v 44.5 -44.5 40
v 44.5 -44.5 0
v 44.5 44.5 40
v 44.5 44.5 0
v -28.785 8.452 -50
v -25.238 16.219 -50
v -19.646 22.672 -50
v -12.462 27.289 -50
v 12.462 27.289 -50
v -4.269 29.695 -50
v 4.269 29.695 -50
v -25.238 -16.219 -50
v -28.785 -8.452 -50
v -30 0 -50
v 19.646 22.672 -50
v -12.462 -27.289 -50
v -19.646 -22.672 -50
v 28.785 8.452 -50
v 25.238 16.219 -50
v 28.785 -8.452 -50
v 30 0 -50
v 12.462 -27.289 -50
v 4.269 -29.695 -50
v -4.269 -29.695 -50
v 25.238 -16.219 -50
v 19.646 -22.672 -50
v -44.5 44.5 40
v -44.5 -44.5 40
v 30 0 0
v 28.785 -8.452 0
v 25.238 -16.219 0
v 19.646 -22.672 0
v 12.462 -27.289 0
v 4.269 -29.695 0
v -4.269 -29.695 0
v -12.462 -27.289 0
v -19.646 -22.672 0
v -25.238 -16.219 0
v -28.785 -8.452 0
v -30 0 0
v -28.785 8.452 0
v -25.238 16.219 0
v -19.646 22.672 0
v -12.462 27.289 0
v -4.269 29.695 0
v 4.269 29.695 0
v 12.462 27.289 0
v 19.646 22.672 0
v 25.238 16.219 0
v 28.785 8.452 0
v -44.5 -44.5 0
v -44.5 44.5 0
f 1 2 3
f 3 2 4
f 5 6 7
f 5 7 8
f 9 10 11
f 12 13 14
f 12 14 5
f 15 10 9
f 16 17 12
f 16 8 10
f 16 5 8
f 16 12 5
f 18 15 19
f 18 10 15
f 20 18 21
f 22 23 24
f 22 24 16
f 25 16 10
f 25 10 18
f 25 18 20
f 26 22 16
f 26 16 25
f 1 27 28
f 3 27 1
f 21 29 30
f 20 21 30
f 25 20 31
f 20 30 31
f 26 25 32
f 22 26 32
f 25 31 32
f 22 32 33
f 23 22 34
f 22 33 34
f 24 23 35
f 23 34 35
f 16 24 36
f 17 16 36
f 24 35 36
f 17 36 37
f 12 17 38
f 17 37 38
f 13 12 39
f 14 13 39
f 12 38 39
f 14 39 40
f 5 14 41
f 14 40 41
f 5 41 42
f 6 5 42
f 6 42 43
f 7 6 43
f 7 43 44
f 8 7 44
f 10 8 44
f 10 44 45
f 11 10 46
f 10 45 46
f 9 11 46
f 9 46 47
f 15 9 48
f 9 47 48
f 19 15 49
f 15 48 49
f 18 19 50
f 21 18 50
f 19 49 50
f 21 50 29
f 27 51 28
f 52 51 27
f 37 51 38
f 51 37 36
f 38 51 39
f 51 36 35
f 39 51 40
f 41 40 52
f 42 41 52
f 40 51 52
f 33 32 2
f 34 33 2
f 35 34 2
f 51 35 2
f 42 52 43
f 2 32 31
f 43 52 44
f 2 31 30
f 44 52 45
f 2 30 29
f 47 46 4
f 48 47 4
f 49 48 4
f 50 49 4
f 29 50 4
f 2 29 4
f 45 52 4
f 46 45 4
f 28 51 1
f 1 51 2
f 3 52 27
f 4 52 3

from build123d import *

# Parameters (mm, degrees)
F0_W     = 89
F0_H     = 89
F1_DEPTH = 40
F2_R     = 30
F3_DEPTH = 50


with BuildPart() as f1:
    # F0 (on Top) → F1 (new body)
    with BuildSketch(Plane.XY):
        Rectangle(F0_W, F0_H)
    extrude(amount=F1_DEPTH)

    # F2 (on face) → F3 (join)
    with BuildSketch(Plane(origin=(0, 0, 0), x_dir=(1, 0, 0), z_dir=(0, 0, -1))):
        Circle(F2_R)
    extrude(amount=F3_DEPTH)


solid = f1.part
